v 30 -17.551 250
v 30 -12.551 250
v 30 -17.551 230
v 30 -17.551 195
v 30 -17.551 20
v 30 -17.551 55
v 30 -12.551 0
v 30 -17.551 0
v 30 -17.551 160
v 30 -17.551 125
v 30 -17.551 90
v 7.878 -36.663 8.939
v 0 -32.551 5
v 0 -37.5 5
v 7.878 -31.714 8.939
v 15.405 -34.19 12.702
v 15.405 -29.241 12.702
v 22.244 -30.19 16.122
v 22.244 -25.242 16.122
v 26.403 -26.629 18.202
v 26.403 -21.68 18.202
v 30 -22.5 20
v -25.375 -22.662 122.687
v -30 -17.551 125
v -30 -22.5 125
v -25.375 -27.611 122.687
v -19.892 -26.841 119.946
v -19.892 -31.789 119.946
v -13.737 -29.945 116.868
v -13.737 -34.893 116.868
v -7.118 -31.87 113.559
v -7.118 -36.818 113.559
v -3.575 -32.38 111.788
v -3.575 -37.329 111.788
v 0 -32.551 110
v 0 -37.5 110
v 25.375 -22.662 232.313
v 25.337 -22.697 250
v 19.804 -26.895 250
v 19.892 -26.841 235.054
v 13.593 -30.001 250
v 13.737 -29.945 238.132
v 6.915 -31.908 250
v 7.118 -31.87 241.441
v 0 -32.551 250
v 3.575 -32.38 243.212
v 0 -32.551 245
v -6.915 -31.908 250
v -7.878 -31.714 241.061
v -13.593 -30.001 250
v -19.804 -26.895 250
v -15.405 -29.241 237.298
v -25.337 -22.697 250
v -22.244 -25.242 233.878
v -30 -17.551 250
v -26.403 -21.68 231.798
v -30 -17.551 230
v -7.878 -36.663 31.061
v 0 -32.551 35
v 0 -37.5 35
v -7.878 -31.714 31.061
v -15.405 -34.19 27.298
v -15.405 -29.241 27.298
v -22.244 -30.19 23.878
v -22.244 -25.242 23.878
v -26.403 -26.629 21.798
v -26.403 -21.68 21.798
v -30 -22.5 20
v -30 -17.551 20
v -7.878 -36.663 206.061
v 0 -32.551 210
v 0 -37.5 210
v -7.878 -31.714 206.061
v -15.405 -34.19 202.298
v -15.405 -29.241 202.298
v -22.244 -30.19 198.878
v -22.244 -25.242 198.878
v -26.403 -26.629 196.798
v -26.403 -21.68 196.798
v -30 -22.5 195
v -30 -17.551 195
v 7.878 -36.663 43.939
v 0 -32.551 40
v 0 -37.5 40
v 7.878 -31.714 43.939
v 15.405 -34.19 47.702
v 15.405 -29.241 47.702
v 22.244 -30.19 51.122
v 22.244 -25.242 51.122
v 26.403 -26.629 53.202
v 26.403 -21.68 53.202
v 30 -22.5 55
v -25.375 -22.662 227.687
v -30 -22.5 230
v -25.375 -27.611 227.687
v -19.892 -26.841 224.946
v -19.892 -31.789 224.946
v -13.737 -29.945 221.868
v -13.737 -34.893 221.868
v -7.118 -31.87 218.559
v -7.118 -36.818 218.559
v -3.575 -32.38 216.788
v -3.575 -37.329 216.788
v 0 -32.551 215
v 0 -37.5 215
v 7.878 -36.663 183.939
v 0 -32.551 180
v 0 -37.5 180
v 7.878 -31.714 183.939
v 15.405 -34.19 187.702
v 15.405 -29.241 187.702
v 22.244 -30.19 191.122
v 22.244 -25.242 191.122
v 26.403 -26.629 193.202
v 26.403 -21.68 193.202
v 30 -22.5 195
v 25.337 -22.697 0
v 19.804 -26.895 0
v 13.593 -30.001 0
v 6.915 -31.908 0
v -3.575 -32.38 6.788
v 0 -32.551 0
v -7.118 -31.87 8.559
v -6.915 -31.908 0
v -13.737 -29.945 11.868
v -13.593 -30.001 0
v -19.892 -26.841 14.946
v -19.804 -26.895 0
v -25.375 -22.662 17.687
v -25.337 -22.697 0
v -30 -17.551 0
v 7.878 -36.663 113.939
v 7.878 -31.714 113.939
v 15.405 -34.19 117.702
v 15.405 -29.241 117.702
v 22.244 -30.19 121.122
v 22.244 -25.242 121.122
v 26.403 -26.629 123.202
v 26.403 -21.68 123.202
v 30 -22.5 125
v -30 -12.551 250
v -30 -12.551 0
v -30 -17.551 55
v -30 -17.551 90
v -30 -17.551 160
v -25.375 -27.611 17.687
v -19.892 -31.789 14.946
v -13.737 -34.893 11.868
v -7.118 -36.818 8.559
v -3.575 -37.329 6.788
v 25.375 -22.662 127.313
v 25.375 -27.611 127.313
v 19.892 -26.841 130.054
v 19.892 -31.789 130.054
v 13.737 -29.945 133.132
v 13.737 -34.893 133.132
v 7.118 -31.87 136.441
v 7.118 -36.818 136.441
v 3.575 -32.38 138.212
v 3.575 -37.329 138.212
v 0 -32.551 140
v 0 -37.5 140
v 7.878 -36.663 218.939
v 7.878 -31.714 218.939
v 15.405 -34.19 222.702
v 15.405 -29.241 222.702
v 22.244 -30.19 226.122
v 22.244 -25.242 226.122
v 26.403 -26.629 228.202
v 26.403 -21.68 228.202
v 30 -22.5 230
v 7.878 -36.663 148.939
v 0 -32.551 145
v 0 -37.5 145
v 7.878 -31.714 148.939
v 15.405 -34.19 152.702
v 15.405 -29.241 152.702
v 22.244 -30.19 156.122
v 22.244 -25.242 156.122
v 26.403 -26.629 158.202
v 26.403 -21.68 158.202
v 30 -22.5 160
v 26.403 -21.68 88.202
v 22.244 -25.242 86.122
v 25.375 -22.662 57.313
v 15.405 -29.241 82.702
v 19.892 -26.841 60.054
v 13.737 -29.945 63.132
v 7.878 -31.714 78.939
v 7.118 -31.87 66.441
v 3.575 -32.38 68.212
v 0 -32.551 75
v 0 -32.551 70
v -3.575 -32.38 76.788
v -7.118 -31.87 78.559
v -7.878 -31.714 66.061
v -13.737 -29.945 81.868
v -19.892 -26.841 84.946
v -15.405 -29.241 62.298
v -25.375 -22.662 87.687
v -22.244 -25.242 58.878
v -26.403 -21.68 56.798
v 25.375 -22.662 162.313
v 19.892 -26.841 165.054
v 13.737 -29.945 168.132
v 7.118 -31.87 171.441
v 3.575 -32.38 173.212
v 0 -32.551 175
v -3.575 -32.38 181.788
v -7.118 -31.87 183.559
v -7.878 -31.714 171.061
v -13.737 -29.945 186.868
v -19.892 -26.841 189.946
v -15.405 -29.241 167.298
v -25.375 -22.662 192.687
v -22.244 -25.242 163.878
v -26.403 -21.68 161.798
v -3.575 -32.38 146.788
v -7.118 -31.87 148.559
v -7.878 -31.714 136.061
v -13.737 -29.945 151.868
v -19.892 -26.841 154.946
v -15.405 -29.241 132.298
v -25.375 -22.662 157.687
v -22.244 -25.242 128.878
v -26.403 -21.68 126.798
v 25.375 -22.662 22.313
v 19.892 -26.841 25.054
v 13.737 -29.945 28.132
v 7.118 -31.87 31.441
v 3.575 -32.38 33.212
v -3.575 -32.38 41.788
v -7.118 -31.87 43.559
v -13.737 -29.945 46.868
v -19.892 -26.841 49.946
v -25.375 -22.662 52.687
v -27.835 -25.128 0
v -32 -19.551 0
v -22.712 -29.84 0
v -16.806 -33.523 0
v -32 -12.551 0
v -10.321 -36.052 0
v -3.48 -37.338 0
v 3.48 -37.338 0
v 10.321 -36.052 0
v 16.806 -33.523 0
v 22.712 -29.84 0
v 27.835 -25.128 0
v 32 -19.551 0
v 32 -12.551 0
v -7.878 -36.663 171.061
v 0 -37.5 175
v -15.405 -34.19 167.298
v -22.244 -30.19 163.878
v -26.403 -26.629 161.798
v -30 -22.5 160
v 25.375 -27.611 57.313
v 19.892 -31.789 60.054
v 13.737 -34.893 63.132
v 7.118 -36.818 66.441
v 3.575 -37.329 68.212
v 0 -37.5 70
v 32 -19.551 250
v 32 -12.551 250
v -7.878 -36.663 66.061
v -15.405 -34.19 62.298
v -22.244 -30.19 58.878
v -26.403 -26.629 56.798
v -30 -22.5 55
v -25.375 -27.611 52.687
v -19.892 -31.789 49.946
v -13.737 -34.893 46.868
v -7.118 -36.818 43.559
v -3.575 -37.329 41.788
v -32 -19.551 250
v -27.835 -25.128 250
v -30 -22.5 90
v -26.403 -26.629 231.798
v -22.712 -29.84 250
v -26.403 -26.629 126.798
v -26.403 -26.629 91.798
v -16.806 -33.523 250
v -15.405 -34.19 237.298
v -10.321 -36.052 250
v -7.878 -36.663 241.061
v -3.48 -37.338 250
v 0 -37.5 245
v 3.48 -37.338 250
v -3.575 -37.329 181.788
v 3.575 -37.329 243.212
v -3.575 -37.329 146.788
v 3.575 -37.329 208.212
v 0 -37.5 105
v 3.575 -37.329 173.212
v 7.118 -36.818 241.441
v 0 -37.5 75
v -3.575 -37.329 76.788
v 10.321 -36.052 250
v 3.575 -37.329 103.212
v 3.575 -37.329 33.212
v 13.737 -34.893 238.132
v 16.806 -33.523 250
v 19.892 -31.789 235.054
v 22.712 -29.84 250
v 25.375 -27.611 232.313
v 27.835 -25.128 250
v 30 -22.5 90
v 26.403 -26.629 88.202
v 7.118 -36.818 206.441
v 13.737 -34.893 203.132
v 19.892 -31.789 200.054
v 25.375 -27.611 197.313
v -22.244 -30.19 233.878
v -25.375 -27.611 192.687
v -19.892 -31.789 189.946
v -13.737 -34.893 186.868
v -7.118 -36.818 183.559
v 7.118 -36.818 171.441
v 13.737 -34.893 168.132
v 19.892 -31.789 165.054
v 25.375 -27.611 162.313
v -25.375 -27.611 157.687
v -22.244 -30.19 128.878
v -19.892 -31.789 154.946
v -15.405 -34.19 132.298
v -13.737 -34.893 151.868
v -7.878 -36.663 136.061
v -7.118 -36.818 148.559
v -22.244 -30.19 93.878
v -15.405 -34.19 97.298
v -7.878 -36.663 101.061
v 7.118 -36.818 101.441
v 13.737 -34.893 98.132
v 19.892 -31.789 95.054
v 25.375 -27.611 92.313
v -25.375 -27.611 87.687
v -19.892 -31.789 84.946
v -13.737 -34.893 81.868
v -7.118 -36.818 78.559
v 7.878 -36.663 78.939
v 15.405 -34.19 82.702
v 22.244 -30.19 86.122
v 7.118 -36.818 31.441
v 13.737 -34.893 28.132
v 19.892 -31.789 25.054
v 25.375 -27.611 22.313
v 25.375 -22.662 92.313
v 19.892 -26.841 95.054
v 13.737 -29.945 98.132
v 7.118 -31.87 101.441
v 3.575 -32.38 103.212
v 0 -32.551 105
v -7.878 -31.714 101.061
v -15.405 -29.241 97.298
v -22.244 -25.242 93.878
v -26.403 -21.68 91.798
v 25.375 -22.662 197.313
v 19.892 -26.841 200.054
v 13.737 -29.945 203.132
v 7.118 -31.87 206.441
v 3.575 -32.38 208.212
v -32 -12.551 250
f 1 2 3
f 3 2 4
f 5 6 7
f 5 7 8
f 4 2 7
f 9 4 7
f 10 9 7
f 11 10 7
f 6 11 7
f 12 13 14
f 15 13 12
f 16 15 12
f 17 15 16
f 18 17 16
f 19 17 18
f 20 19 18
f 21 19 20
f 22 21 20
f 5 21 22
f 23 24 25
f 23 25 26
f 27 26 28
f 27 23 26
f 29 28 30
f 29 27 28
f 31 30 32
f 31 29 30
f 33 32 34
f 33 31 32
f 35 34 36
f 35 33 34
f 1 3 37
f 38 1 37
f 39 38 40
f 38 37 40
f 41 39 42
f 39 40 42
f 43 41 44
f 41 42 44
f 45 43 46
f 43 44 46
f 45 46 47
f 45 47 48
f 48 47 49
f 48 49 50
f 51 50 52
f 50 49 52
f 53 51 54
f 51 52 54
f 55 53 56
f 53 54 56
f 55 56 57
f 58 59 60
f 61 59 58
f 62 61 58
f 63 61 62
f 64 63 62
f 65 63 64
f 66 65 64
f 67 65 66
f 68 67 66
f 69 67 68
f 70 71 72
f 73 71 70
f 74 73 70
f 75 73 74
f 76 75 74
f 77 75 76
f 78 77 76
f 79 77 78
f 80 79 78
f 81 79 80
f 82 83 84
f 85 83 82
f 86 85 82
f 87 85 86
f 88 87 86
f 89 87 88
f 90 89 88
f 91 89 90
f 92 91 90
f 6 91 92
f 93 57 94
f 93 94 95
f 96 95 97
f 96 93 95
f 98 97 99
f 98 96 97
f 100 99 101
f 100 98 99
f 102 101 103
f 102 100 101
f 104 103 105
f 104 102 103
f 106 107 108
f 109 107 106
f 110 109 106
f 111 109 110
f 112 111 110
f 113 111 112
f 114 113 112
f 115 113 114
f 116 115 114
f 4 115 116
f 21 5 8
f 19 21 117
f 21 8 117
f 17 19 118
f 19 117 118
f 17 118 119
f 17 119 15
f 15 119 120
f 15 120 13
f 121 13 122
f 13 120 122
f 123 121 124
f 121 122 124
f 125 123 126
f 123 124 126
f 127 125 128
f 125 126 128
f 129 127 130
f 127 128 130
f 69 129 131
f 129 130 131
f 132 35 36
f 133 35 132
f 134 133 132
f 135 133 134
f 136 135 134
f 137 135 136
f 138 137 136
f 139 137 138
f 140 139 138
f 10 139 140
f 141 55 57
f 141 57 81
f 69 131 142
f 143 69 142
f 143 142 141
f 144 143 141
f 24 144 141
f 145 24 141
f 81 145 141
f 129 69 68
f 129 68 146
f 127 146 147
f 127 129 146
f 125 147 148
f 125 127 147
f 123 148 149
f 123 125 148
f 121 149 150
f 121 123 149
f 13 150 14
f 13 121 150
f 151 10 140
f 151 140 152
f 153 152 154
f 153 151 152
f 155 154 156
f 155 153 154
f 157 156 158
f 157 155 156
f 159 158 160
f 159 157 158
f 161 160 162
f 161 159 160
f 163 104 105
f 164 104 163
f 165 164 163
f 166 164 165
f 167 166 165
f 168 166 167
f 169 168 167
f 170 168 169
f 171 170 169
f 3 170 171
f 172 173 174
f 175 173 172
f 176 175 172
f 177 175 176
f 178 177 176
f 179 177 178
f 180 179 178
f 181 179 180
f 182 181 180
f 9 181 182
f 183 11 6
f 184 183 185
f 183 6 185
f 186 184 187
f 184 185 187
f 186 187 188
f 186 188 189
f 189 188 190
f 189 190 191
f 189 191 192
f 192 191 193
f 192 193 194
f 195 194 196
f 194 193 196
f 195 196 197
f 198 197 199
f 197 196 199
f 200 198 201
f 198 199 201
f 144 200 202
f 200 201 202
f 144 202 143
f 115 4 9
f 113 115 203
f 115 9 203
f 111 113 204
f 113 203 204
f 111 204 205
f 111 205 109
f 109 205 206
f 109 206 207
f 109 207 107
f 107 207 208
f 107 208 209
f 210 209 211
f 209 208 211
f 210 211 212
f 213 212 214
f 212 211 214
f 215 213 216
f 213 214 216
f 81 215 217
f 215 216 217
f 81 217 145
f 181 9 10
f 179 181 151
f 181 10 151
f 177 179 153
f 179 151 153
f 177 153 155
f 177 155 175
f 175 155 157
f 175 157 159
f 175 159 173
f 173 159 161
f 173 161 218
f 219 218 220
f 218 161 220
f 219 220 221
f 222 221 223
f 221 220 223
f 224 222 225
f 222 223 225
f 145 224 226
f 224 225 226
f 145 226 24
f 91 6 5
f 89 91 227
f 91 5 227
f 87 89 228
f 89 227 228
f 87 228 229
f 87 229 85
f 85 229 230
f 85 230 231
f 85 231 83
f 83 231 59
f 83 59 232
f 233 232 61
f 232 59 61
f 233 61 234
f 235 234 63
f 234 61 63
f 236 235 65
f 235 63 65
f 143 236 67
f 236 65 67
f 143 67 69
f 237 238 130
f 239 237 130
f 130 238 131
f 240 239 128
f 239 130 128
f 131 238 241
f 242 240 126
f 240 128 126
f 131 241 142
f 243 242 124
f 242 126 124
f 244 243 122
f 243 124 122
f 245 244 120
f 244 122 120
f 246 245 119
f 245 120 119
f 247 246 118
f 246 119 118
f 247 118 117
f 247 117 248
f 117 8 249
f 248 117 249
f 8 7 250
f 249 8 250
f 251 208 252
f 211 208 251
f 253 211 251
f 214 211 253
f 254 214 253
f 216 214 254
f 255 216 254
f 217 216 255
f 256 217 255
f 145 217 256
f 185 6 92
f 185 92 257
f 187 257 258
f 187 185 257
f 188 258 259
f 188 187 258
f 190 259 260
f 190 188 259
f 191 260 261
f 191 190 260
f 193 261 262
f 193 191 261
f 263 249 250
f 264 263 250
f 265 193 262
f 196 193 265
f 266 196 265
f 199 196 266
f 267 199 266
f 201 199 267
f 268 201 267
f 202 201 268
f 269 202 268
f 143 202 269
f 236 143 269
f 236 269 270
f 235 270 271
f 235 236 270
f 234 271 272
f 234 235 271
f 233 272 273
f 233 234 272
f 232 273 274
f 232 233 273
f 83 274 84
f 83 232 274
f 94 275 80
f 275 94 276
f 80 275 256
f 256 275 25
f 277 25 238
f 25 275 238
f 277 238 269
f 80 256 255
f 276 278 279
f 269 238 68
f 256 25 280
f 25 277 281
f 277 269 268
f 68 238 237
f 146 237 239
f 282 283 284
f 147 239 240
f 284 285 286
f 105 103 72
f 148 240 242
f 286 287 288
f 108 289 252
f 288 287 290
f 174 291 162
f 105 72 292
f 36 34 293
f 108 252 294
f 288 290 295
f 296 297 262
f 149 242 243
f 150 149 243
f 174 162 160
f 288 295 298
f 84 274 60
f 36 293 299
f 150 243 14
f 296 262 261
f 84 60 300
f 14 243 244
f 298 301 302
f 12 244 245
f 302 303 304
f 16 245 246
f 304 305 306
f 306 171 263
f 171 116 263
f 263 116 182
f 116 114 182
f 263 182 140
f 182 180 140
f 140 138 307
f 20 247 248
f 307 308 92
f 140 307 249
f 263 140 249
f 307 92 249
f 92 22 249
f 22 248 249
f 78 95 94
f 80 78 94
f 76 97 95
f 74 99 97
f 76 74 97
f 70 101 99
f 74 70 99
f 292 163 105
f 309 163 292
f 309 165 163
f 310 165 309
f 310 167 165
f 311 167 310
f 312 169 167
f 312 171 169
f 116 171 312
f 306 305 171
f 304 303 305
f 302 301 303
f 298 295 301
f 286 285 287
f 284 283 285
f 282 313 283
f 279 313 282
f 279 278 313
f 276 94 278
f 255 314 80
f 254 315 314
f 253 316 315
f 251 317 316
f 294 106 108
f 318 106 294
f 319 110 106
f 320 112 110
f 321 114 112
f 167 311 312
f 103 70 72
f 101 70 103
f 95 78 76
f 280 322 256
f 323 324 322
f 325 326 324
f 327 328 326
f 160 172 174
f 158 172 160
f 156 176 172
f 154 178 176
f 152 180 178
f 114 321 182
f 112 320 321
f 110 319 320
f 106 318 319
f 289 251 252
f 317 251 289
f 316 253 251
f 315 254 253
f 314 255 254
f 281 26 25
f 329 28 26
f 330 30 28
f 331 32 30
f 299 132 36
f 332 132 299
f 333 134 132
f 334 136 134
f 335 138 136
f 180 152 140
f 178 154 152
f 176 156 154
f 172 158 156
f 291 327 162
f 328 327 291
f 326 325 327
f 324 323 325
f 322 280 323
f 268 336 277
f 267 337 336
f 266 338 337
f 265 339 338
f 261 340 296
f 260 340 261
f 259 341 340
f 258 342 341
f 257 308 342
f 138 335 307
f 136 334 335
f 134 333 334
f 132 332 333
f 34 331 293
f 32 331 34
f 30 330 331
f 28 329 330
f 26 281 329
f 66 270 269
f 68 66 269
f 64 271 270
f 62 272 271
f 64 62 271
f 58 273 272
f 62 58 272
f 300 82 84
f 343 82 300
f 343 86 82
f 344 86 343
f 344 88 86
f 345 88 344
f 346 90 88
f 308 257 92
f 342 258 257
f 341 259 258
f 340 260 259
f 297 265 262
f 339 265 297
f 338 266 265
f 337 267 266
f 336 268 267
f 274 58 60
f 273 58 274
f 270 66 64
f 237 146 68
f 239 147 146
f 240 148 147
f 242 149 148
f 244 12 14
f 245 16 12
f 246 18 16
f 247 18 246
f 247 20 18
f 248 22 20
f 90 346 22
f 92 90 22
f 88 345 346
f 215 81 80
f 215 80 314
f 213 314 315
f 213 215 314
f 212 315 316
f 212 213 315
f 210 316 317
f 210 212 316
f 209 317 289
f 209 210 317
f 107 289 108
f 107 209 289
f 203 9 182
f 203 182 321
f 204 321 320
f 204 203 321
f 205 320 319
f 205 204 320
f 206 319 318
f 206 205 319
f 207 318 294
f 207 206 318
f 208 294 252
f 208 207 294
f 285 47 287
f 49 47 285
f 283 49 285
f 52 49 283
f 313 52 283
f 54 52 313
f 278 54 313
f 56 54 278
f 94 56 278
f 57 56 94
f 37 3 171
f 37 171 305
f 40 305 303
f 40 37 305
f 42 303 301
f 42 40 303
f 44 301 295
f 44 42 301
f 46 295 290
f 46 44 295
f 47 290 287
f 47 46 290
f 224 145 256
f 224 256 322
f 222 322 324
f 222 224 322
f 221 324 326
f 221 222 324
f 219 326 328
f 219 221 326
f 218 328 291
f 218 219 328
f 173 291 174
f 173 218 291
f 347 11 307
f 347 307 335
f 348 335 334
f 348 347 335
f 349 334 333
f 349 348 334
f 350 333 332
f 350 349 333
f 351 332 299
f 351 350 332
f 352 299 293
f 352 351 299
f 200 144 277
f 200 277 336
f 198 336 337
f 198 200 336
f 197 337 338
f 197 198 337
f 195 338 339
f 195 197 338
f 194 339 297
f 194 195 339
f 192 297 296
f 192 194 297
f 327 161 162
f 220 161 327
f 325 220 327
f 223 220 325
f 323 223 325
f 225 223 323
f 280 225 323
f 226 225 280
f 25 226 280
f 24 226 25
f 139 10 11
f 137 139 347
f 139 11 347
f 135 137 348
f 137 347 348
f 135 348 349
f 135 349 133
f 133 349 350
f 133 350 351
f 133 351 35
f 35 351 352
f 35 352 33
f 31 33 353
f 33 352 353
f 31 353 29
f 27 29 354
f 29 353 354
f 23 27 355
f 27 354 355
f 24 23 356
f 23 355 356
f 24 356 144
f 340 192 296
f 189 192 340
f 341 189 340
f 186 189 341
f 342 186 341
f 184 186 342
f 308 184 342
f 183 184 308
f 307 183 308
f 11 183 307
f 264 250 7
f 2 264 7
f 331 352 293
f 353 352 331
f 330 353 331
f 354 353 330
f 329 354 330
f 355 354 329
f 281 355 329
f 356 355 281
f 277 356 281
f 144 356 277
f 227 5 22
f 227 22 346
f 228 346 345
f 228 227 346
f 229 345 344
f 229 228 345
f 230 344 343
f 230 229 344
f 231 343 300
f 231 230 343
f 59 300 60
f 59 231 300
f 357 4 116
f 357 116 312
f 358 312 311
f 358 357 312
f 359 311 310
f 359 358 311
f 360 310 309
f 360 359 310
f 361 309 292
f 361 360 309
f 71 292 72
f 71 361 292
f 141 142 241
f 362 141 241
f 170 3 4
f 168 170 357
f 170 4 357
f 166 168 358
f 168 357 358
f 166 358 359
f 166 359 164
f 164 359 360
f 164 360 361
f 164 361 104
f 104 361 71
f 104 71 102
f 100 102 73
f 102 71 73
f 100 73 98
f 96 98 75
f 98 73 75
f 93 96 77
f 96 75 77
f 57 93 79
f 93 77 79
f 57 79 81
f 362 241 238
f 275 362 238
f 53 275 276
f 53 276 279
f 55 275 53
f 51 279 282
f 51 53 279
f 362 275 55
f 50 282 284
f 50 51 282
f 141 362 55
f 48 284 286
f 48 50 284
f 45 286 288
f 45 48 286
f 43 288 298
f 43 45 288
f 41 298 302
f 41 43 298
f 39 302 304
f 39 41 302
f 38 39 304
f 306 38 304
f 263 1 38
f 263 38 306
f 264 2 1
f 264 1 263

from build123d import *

# Parameters (mm, degrees)
F1_DEPTH = 250
F3_DEPTH = 250
F5_DEPTH = 37.501


# Not quite as in the source:
# - a feature names something its author has since deleted; it is built from what else it names


with BuildPart() as f1:
    # F0 (on Top) → F1 (new body)
    with BuildSketch(Plane.XY):
        with BuildLine():
            Line((-32, -12.551214796), (-32, -19.551214796))
            ThreePointArc((-32, -19.551214796), (0, -37.5), (32, -19.551214796))
            Line((32, -19.551214796), (32, -12.551214796))
            Line((32, -12.551214796), (0, -12.551214796))
            Line((0, -12.551214796), (-32, -12.551214796))
        make_face()
    extrude(amount=F1_DEPTH)

    # F2 (on face) → F3 (cut)
    with BuildSketch(Plane(origin=(0, 0, 0), x_dir=(1, 0, 0), z_dir=(0, 0, -1))):
        with BuildLine():
            Line((-30, 12.551214796), (30, 12.551214796))
            Line((30, 12.551214796), (30, 17.551214796))
            ThreePointArc((30, 17.551214796), (0, 32.551214796), (-30, 17.551214796))
            Line((-30, 17.551214796), (-30, 12.551214796))
        make_face()
    extrude(amount=-F3_DEPTH, mode=Mode.SUBTRACT)

    # F4 (on Front) → F5 (cut, through all)
    with BuildSketch(Plane.XZ):
        Polygon((-30, 20), (0, 5), (30, 20), (0, 35), align=None)
        Polygon((0, 40), (30, 55), (0, 70), (-30, 55), align=None)
        Polygon((0, 110), (30, 125), (0, 140), (-30, 125), align=None)
        Polygon((0, 145), (30, 160), (0, 175), (-30, 160), align=None)
        Polygon((0, 180), (30, 195), (0, 210), (-30, 195), align=None)
        Polygon((0, 215), (30, 230), (0, 245), (-30, 230), align=None)
        Polygon((0, 75), (30, 90), (0, 105), (-30, 90), align=None)
    extrude(amount=F5_DEPTH, mode=Mode.SUBTRACT)


solid = f1.part
